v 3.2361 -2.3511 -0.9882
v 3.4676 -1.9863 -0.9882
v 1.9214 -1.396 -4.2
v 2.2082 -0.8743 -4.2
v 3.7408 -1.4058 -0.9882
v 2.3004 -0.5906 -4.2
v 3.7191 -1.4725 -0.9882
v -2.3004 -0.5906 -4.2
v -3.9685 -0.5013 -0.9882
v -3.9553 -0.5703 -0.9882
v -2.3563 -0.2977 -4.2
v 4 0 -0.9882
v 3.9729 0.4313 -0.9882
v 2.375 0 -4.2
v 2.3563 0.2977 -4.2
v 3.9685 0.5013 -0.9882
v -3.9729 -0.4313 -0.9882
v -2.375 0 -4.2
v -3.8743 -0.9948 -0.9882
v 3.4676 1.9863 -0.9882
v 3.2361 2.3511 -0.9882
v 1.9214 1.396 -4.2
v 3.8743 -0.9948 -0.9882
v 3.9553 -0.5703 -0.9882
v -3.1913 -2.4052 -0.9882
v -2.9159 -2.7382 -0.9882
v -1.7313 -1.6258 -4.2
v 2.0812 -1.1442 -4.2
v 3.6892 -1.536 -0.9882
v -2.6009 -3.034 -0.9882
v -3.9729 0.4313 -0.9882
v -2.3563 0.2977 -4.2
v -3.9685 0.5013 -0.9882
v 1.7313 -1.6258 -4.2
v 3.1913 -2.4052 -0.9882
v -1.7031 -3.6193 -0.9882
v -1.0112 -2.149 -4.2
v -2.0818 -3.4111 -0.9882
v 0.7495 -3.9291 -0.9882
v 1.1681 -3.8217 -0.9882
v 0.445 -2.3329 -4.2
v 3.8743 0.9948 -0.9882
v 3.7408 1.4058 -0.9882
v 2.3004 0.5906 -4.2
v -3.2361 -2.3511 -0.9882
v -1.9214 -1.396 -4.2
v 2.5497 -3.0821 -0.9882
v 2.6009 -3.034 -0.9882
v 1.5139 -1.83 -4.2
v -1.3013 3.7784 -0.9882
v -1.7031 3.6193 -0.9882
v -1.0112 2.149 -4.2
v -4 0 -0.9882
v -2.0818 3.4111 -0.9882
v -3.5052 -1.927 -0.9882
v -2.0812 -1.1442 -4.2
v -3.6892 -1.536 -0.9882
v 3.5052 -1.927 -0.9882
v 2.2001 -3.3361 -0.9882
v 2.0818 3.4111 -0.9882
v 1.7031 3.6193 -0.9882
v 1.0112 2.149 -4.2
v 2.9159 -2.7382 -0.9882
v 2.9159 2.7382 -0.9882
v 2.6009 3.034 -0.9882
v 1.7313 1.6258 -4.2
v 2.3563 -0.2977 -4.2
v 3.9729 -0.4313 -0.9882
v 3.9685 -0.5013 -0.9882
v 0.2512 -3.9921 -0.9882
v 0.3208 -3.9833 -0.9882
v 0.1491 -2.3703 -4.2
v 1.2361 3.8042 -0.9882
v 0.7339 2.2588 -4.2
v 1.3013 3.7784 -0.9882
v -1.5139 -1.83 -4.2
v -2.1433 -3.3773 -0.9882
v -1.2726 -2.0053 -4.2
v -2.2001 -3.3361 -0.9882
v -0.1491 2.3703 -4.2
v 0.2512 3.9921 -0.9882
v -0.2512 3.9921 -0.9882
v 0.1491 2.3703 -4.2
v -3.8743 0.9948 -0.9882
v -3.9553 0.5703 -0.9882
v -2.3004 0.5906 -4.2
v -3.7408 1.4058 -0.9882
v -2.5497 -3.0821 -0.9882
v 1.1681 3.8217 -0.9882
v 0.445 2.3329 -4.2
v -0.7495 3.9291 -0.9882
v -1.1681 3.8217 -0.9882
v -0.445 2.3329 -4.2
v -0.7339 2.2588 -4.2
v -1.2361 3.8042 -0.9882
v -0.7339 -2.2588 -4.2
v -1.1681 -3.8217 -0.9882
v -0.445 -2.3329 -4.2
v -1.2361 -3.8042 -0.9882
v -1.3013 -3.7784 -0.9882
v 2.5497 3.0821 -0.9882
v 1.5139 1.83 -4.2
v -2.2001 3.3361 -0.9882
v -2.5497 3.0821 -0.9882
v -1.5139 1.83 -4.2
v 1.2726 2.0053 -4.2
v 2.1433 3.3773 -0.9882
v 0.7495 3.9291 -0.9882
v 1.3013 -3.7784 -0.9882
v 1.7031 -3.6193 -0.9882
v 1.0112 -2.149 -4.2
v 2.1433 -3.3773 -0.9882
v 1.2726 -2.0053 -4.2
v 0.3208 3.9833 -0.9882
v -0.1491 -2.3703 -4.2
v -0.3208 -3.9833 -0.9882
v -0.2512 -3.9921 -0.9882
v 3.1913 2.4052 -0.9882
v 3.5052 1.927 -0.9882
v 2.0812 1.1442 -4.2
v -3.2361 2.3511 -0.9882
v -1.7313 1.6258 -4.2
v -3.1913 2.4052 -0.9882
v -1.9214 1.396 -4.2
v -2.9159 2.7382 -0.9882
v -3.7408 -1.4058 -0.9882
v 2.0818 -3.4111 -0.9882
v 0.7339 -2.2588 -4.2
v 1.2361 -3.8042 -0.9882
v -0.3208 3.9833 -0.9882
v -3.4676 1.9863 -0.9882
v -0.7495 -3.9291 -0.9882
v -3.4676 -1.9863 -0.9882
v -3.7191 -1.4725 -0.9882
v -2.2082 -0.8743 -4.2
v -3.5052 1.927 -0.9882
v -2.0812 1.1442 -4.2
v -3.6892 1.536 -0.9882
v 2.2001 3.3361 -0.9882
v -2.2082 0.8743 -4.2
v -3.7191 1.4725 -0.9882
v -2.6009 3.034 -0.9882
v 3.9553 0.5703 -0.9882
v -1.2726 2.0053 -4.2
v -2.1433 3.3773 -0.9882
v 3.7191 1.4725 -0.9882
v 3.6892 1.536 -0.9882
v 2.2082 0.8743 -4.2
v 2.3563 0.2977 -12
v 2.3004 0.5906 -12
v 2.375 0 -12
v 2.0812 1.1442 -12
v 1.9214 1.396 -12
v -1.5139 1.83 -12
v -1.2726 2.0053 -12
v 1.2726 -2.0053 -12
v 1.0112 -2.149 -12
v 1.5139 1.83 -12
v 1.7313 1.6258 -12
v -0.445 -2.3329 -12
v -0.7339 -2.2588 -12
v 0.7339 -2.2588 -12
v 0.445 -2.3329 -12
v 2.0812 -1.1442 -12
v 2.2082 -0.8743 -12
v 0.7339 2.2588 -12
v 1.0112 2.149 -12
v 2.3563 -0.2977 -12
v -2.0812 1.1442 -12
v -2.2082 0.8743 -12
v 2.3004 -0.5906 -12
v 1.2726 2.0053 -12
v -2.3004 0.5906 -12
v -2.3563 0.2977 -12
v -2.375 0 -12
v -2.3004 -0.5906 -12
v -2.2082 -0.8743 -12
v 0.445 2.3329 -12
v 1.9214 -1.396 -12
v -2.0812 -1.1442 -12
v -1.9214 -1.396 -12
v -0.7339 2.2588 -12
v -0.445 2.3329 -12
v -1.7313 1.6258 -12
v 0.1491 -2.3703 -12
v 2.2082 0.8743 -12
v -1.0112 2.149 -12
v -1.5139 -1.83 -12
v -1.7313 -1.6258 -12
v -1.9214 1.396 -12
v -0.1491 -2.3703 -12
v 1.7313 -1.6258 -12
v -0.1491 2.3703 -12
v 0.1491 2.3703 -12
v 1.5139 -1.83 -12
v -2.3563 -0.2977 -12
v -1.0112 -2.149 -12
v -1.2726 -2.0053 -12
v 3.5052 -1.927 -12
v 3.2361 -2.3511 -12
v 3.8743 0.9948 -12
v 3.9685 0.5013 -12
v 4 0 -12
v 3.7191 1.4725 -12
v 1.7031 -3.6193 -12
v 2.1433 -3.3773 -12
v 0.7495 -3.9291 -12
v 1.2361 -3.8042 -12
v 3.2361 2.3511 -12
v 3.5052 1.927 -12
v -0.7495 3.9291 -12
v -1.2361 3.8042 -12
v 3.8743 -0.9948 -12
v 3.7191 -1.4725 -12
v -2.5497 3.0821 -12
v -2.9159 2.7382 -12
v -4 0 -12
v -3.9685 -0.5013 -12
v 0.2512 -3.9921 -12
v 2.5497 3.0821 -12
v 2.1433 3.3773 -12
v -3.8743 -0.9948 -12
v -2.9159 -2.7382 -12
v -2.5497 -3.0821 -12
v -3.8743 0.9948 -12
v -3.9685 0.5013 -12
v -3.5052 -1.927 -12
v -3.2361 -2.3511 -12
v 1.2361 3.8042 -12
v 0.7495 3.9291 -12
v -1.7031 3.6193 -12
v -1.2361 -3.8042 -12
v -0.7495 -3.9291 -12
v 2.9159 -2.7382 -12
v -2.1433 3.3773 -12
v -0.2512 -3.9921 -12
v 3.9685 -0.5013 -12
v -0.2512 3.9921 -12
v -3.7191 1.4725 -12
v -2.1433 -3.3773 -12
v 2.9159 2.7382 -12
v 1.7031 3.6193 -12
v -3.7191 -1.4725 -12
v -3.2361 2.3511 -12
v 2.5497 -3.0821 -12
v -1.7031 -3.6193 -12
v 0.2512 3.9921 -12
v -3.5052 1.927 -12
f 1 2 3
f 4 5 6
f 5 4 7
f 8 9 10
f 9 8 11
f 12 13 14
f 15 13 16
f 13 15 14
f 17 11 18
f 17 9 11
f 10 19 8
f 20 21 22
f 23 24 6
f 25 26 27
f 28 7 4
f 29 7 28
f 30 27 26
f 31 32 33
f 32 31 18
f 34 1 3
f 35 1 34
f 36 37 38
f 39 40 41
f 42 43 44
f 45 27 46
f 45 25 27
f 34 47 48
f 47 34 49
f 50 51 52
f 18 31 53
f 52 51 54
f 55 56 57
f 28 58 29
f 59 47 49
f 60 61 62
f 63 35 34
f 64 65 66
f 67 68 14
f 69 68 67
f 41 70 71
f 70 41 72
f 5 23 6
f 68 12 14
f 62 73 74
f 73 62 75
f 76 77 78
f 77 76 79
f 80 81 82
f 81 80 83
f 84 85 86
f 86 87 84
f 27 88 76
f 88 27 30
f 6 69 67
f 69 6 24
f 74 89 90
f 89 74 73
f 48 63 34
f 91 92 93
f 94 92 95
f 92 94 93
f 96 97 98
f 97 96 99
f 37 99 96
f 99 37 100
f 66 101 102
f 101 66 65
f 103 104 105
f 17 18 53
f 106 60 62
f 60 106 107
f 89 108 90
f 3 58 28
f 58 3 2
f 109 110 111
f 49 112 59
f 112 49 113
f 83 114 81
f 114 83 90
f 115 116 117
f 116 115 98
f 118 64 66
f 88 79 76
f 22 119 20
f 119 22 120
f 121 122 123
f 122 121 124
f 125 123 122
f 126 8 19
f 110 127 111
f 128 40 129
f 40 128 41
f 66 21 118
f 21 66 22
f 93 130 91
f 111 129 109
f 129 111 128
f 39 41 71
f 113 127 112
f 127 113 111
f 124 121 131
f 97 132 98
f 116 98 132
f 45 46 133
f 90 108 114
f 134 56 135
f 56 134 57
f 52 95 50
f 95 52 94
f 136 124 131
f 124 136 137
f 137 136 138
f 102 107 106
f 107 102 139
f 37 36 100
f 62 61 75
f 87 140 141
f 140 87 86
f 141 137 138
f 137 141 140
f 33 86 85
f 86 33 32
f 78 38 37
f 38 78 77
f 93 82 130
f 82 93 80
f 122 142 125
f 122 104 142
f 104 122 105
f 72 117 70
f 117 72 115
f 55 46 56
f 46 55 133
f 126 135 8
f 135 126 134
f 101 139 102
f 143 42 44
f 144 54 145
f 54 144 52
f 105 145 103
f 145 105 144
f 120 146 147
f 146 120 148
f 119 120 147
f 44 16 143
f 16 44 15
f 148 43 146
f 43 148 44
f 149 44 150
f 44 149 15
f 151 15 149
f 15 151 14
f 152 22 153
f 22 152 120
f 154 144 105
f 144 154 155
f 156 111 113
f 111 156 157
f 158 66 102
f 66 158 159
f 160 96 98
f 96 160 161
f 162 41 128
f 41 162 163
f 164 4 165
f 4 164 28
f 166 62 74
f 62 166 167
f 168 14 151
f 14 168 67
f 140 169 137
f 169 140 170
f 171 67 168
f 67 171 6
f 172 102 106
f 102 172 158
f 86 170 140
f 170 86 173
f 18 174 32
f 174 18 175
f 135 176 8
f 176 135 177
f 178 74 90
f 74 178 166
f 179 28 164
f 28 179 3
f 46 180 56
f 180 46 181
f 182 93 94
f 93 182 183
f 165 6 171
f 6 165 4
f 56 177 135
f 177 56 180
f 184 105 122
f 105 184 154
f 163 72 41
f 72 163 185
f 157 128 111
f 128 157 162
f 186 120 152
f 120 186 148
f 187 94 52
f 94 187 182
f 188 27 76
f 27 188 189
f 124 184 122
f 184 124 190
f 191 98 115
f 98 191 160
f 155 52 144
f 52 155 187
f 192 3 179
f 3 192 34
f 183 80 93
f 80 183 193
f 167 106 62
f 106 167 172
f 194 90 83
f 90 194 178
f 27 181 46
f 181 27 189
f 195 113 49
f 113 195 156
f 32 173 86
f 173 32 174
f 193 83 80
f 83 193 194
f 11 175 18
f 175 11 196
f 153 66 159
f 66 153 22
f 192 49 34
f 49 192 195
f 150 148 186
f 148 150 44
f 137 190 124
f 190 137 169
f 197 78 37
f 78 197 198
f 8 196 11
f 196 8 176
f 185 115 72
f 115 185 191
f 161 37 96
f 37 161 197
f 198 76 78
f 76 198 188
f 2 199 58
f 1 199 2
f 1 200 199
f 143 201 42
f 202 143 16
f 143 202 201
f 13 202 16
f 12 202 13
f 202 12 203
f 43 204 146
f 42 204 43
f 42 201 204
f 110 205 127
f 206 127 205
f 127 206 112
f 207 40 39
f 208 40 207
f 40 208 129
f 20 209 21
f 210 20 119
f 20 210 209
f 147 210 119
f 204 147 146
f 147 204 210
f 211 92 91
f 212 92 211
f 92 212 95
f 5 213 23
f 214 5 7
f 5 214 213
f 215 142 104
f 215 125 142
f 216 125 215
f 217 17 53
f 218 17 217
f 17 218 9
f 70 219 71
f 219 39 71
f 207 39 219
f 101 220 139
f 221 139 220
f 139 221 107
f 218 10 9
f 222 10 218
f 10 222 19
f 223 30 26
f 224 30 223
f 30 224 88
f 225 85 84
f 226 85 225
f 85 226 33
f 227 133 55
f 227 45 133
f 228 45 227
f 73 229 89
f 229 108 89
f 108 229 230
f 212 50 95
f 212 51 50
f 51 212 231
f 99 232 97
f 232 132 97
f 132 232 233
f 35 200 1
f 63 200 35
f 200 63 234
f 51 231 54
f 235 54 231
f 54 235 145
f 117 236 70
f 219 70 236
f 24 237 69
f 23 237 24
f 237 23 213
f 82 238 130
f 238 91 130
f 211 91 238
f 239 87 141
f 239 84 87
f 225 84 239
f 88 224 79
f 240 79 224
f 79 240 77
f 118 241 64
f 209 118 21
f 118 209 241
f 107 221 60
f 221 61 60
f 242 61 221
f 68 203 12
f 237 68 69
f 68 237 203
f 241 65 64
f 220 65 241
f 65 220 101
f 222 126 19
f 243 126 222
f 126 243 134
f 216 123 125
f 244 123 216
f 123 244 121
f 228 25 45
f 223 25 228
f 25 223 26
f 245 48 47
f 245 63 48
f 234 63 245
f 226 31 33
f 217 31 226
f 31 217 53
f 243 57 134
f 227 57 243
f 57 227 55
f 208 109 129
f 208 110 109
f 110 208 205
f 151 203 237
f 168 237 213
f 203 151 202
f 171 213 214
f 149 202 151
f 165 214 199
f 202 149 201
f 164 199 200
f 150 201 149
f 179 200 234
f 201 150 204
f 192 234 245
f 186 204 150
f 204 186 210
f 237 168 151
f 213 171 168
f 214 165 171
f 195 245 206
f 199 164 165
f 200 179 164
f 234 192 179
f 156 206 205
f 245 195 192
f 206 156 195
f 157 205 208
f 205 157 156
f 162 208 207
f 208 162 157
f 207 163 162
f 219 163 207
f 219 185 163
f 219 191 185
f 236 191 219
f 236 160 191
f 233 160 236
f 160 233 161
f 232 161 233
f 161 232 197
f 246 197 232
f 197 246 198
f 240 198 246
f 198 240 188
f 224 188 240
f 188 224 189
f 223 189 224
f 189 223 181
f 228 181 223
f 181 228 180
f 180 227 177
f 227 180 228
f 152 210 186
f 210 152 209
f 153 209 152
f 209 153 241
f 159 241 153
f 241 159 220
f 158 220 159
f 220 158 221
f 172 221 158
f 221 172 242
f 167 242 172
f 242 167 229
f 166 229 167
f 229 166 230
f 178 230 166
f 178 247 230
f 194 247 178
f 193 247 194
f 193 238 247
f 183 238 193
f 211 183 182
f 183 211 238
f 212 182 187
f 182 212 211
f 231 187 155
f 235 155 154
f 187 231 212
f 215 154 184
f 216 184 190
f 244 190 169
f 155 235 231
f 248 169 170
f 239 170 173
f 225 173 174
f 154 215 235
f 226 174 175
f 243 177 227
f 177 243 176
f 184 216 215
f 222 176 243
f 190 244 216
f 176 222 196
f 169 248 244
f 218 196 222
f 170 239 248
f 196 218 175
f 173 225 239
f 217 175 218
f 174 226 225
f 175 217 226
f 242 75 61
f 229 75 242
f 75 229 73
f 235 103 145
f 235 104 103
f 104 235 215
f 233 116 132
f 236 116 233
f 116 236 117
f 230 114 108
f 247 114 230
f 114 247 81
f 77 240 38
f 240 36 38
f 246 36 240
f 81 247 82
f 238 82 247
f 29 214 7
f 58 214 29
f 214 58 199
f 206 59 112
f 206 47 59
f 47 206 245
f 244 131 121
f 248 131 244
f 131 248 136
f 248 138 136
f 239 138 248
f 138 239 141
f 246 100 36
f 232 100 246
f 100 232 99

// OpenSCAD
$fn = 50;

difference() {
	union() {
		translate(v = [0, 0, -12.0]) {
			cylinder(h = 12, r = 4.0);
		}
	}
	union() {
		translate(v = [0, 0, 0]) {
			rotate(a = [0, 0, 0]) {
				difference() {
					union() {
						translate(v = [0, 0, -15.0]) {
							cylinder(h = 15, r = 2.25);
						}
						translate(v = [0, 0, -4.2]) {
							cylinder(h = 4.2, r1 = 2.375, r2 = 4.5);
						}
						translate(v = [0, 0, -15.0]) {
							cylinder(h = 15, r = 2.375);
						}
						translate(v = [0, 0, -15.0]) {
							cylinder(h = 15, r = 2.25);
						}
					}
					union();
				}
			}
		}
	}
}
